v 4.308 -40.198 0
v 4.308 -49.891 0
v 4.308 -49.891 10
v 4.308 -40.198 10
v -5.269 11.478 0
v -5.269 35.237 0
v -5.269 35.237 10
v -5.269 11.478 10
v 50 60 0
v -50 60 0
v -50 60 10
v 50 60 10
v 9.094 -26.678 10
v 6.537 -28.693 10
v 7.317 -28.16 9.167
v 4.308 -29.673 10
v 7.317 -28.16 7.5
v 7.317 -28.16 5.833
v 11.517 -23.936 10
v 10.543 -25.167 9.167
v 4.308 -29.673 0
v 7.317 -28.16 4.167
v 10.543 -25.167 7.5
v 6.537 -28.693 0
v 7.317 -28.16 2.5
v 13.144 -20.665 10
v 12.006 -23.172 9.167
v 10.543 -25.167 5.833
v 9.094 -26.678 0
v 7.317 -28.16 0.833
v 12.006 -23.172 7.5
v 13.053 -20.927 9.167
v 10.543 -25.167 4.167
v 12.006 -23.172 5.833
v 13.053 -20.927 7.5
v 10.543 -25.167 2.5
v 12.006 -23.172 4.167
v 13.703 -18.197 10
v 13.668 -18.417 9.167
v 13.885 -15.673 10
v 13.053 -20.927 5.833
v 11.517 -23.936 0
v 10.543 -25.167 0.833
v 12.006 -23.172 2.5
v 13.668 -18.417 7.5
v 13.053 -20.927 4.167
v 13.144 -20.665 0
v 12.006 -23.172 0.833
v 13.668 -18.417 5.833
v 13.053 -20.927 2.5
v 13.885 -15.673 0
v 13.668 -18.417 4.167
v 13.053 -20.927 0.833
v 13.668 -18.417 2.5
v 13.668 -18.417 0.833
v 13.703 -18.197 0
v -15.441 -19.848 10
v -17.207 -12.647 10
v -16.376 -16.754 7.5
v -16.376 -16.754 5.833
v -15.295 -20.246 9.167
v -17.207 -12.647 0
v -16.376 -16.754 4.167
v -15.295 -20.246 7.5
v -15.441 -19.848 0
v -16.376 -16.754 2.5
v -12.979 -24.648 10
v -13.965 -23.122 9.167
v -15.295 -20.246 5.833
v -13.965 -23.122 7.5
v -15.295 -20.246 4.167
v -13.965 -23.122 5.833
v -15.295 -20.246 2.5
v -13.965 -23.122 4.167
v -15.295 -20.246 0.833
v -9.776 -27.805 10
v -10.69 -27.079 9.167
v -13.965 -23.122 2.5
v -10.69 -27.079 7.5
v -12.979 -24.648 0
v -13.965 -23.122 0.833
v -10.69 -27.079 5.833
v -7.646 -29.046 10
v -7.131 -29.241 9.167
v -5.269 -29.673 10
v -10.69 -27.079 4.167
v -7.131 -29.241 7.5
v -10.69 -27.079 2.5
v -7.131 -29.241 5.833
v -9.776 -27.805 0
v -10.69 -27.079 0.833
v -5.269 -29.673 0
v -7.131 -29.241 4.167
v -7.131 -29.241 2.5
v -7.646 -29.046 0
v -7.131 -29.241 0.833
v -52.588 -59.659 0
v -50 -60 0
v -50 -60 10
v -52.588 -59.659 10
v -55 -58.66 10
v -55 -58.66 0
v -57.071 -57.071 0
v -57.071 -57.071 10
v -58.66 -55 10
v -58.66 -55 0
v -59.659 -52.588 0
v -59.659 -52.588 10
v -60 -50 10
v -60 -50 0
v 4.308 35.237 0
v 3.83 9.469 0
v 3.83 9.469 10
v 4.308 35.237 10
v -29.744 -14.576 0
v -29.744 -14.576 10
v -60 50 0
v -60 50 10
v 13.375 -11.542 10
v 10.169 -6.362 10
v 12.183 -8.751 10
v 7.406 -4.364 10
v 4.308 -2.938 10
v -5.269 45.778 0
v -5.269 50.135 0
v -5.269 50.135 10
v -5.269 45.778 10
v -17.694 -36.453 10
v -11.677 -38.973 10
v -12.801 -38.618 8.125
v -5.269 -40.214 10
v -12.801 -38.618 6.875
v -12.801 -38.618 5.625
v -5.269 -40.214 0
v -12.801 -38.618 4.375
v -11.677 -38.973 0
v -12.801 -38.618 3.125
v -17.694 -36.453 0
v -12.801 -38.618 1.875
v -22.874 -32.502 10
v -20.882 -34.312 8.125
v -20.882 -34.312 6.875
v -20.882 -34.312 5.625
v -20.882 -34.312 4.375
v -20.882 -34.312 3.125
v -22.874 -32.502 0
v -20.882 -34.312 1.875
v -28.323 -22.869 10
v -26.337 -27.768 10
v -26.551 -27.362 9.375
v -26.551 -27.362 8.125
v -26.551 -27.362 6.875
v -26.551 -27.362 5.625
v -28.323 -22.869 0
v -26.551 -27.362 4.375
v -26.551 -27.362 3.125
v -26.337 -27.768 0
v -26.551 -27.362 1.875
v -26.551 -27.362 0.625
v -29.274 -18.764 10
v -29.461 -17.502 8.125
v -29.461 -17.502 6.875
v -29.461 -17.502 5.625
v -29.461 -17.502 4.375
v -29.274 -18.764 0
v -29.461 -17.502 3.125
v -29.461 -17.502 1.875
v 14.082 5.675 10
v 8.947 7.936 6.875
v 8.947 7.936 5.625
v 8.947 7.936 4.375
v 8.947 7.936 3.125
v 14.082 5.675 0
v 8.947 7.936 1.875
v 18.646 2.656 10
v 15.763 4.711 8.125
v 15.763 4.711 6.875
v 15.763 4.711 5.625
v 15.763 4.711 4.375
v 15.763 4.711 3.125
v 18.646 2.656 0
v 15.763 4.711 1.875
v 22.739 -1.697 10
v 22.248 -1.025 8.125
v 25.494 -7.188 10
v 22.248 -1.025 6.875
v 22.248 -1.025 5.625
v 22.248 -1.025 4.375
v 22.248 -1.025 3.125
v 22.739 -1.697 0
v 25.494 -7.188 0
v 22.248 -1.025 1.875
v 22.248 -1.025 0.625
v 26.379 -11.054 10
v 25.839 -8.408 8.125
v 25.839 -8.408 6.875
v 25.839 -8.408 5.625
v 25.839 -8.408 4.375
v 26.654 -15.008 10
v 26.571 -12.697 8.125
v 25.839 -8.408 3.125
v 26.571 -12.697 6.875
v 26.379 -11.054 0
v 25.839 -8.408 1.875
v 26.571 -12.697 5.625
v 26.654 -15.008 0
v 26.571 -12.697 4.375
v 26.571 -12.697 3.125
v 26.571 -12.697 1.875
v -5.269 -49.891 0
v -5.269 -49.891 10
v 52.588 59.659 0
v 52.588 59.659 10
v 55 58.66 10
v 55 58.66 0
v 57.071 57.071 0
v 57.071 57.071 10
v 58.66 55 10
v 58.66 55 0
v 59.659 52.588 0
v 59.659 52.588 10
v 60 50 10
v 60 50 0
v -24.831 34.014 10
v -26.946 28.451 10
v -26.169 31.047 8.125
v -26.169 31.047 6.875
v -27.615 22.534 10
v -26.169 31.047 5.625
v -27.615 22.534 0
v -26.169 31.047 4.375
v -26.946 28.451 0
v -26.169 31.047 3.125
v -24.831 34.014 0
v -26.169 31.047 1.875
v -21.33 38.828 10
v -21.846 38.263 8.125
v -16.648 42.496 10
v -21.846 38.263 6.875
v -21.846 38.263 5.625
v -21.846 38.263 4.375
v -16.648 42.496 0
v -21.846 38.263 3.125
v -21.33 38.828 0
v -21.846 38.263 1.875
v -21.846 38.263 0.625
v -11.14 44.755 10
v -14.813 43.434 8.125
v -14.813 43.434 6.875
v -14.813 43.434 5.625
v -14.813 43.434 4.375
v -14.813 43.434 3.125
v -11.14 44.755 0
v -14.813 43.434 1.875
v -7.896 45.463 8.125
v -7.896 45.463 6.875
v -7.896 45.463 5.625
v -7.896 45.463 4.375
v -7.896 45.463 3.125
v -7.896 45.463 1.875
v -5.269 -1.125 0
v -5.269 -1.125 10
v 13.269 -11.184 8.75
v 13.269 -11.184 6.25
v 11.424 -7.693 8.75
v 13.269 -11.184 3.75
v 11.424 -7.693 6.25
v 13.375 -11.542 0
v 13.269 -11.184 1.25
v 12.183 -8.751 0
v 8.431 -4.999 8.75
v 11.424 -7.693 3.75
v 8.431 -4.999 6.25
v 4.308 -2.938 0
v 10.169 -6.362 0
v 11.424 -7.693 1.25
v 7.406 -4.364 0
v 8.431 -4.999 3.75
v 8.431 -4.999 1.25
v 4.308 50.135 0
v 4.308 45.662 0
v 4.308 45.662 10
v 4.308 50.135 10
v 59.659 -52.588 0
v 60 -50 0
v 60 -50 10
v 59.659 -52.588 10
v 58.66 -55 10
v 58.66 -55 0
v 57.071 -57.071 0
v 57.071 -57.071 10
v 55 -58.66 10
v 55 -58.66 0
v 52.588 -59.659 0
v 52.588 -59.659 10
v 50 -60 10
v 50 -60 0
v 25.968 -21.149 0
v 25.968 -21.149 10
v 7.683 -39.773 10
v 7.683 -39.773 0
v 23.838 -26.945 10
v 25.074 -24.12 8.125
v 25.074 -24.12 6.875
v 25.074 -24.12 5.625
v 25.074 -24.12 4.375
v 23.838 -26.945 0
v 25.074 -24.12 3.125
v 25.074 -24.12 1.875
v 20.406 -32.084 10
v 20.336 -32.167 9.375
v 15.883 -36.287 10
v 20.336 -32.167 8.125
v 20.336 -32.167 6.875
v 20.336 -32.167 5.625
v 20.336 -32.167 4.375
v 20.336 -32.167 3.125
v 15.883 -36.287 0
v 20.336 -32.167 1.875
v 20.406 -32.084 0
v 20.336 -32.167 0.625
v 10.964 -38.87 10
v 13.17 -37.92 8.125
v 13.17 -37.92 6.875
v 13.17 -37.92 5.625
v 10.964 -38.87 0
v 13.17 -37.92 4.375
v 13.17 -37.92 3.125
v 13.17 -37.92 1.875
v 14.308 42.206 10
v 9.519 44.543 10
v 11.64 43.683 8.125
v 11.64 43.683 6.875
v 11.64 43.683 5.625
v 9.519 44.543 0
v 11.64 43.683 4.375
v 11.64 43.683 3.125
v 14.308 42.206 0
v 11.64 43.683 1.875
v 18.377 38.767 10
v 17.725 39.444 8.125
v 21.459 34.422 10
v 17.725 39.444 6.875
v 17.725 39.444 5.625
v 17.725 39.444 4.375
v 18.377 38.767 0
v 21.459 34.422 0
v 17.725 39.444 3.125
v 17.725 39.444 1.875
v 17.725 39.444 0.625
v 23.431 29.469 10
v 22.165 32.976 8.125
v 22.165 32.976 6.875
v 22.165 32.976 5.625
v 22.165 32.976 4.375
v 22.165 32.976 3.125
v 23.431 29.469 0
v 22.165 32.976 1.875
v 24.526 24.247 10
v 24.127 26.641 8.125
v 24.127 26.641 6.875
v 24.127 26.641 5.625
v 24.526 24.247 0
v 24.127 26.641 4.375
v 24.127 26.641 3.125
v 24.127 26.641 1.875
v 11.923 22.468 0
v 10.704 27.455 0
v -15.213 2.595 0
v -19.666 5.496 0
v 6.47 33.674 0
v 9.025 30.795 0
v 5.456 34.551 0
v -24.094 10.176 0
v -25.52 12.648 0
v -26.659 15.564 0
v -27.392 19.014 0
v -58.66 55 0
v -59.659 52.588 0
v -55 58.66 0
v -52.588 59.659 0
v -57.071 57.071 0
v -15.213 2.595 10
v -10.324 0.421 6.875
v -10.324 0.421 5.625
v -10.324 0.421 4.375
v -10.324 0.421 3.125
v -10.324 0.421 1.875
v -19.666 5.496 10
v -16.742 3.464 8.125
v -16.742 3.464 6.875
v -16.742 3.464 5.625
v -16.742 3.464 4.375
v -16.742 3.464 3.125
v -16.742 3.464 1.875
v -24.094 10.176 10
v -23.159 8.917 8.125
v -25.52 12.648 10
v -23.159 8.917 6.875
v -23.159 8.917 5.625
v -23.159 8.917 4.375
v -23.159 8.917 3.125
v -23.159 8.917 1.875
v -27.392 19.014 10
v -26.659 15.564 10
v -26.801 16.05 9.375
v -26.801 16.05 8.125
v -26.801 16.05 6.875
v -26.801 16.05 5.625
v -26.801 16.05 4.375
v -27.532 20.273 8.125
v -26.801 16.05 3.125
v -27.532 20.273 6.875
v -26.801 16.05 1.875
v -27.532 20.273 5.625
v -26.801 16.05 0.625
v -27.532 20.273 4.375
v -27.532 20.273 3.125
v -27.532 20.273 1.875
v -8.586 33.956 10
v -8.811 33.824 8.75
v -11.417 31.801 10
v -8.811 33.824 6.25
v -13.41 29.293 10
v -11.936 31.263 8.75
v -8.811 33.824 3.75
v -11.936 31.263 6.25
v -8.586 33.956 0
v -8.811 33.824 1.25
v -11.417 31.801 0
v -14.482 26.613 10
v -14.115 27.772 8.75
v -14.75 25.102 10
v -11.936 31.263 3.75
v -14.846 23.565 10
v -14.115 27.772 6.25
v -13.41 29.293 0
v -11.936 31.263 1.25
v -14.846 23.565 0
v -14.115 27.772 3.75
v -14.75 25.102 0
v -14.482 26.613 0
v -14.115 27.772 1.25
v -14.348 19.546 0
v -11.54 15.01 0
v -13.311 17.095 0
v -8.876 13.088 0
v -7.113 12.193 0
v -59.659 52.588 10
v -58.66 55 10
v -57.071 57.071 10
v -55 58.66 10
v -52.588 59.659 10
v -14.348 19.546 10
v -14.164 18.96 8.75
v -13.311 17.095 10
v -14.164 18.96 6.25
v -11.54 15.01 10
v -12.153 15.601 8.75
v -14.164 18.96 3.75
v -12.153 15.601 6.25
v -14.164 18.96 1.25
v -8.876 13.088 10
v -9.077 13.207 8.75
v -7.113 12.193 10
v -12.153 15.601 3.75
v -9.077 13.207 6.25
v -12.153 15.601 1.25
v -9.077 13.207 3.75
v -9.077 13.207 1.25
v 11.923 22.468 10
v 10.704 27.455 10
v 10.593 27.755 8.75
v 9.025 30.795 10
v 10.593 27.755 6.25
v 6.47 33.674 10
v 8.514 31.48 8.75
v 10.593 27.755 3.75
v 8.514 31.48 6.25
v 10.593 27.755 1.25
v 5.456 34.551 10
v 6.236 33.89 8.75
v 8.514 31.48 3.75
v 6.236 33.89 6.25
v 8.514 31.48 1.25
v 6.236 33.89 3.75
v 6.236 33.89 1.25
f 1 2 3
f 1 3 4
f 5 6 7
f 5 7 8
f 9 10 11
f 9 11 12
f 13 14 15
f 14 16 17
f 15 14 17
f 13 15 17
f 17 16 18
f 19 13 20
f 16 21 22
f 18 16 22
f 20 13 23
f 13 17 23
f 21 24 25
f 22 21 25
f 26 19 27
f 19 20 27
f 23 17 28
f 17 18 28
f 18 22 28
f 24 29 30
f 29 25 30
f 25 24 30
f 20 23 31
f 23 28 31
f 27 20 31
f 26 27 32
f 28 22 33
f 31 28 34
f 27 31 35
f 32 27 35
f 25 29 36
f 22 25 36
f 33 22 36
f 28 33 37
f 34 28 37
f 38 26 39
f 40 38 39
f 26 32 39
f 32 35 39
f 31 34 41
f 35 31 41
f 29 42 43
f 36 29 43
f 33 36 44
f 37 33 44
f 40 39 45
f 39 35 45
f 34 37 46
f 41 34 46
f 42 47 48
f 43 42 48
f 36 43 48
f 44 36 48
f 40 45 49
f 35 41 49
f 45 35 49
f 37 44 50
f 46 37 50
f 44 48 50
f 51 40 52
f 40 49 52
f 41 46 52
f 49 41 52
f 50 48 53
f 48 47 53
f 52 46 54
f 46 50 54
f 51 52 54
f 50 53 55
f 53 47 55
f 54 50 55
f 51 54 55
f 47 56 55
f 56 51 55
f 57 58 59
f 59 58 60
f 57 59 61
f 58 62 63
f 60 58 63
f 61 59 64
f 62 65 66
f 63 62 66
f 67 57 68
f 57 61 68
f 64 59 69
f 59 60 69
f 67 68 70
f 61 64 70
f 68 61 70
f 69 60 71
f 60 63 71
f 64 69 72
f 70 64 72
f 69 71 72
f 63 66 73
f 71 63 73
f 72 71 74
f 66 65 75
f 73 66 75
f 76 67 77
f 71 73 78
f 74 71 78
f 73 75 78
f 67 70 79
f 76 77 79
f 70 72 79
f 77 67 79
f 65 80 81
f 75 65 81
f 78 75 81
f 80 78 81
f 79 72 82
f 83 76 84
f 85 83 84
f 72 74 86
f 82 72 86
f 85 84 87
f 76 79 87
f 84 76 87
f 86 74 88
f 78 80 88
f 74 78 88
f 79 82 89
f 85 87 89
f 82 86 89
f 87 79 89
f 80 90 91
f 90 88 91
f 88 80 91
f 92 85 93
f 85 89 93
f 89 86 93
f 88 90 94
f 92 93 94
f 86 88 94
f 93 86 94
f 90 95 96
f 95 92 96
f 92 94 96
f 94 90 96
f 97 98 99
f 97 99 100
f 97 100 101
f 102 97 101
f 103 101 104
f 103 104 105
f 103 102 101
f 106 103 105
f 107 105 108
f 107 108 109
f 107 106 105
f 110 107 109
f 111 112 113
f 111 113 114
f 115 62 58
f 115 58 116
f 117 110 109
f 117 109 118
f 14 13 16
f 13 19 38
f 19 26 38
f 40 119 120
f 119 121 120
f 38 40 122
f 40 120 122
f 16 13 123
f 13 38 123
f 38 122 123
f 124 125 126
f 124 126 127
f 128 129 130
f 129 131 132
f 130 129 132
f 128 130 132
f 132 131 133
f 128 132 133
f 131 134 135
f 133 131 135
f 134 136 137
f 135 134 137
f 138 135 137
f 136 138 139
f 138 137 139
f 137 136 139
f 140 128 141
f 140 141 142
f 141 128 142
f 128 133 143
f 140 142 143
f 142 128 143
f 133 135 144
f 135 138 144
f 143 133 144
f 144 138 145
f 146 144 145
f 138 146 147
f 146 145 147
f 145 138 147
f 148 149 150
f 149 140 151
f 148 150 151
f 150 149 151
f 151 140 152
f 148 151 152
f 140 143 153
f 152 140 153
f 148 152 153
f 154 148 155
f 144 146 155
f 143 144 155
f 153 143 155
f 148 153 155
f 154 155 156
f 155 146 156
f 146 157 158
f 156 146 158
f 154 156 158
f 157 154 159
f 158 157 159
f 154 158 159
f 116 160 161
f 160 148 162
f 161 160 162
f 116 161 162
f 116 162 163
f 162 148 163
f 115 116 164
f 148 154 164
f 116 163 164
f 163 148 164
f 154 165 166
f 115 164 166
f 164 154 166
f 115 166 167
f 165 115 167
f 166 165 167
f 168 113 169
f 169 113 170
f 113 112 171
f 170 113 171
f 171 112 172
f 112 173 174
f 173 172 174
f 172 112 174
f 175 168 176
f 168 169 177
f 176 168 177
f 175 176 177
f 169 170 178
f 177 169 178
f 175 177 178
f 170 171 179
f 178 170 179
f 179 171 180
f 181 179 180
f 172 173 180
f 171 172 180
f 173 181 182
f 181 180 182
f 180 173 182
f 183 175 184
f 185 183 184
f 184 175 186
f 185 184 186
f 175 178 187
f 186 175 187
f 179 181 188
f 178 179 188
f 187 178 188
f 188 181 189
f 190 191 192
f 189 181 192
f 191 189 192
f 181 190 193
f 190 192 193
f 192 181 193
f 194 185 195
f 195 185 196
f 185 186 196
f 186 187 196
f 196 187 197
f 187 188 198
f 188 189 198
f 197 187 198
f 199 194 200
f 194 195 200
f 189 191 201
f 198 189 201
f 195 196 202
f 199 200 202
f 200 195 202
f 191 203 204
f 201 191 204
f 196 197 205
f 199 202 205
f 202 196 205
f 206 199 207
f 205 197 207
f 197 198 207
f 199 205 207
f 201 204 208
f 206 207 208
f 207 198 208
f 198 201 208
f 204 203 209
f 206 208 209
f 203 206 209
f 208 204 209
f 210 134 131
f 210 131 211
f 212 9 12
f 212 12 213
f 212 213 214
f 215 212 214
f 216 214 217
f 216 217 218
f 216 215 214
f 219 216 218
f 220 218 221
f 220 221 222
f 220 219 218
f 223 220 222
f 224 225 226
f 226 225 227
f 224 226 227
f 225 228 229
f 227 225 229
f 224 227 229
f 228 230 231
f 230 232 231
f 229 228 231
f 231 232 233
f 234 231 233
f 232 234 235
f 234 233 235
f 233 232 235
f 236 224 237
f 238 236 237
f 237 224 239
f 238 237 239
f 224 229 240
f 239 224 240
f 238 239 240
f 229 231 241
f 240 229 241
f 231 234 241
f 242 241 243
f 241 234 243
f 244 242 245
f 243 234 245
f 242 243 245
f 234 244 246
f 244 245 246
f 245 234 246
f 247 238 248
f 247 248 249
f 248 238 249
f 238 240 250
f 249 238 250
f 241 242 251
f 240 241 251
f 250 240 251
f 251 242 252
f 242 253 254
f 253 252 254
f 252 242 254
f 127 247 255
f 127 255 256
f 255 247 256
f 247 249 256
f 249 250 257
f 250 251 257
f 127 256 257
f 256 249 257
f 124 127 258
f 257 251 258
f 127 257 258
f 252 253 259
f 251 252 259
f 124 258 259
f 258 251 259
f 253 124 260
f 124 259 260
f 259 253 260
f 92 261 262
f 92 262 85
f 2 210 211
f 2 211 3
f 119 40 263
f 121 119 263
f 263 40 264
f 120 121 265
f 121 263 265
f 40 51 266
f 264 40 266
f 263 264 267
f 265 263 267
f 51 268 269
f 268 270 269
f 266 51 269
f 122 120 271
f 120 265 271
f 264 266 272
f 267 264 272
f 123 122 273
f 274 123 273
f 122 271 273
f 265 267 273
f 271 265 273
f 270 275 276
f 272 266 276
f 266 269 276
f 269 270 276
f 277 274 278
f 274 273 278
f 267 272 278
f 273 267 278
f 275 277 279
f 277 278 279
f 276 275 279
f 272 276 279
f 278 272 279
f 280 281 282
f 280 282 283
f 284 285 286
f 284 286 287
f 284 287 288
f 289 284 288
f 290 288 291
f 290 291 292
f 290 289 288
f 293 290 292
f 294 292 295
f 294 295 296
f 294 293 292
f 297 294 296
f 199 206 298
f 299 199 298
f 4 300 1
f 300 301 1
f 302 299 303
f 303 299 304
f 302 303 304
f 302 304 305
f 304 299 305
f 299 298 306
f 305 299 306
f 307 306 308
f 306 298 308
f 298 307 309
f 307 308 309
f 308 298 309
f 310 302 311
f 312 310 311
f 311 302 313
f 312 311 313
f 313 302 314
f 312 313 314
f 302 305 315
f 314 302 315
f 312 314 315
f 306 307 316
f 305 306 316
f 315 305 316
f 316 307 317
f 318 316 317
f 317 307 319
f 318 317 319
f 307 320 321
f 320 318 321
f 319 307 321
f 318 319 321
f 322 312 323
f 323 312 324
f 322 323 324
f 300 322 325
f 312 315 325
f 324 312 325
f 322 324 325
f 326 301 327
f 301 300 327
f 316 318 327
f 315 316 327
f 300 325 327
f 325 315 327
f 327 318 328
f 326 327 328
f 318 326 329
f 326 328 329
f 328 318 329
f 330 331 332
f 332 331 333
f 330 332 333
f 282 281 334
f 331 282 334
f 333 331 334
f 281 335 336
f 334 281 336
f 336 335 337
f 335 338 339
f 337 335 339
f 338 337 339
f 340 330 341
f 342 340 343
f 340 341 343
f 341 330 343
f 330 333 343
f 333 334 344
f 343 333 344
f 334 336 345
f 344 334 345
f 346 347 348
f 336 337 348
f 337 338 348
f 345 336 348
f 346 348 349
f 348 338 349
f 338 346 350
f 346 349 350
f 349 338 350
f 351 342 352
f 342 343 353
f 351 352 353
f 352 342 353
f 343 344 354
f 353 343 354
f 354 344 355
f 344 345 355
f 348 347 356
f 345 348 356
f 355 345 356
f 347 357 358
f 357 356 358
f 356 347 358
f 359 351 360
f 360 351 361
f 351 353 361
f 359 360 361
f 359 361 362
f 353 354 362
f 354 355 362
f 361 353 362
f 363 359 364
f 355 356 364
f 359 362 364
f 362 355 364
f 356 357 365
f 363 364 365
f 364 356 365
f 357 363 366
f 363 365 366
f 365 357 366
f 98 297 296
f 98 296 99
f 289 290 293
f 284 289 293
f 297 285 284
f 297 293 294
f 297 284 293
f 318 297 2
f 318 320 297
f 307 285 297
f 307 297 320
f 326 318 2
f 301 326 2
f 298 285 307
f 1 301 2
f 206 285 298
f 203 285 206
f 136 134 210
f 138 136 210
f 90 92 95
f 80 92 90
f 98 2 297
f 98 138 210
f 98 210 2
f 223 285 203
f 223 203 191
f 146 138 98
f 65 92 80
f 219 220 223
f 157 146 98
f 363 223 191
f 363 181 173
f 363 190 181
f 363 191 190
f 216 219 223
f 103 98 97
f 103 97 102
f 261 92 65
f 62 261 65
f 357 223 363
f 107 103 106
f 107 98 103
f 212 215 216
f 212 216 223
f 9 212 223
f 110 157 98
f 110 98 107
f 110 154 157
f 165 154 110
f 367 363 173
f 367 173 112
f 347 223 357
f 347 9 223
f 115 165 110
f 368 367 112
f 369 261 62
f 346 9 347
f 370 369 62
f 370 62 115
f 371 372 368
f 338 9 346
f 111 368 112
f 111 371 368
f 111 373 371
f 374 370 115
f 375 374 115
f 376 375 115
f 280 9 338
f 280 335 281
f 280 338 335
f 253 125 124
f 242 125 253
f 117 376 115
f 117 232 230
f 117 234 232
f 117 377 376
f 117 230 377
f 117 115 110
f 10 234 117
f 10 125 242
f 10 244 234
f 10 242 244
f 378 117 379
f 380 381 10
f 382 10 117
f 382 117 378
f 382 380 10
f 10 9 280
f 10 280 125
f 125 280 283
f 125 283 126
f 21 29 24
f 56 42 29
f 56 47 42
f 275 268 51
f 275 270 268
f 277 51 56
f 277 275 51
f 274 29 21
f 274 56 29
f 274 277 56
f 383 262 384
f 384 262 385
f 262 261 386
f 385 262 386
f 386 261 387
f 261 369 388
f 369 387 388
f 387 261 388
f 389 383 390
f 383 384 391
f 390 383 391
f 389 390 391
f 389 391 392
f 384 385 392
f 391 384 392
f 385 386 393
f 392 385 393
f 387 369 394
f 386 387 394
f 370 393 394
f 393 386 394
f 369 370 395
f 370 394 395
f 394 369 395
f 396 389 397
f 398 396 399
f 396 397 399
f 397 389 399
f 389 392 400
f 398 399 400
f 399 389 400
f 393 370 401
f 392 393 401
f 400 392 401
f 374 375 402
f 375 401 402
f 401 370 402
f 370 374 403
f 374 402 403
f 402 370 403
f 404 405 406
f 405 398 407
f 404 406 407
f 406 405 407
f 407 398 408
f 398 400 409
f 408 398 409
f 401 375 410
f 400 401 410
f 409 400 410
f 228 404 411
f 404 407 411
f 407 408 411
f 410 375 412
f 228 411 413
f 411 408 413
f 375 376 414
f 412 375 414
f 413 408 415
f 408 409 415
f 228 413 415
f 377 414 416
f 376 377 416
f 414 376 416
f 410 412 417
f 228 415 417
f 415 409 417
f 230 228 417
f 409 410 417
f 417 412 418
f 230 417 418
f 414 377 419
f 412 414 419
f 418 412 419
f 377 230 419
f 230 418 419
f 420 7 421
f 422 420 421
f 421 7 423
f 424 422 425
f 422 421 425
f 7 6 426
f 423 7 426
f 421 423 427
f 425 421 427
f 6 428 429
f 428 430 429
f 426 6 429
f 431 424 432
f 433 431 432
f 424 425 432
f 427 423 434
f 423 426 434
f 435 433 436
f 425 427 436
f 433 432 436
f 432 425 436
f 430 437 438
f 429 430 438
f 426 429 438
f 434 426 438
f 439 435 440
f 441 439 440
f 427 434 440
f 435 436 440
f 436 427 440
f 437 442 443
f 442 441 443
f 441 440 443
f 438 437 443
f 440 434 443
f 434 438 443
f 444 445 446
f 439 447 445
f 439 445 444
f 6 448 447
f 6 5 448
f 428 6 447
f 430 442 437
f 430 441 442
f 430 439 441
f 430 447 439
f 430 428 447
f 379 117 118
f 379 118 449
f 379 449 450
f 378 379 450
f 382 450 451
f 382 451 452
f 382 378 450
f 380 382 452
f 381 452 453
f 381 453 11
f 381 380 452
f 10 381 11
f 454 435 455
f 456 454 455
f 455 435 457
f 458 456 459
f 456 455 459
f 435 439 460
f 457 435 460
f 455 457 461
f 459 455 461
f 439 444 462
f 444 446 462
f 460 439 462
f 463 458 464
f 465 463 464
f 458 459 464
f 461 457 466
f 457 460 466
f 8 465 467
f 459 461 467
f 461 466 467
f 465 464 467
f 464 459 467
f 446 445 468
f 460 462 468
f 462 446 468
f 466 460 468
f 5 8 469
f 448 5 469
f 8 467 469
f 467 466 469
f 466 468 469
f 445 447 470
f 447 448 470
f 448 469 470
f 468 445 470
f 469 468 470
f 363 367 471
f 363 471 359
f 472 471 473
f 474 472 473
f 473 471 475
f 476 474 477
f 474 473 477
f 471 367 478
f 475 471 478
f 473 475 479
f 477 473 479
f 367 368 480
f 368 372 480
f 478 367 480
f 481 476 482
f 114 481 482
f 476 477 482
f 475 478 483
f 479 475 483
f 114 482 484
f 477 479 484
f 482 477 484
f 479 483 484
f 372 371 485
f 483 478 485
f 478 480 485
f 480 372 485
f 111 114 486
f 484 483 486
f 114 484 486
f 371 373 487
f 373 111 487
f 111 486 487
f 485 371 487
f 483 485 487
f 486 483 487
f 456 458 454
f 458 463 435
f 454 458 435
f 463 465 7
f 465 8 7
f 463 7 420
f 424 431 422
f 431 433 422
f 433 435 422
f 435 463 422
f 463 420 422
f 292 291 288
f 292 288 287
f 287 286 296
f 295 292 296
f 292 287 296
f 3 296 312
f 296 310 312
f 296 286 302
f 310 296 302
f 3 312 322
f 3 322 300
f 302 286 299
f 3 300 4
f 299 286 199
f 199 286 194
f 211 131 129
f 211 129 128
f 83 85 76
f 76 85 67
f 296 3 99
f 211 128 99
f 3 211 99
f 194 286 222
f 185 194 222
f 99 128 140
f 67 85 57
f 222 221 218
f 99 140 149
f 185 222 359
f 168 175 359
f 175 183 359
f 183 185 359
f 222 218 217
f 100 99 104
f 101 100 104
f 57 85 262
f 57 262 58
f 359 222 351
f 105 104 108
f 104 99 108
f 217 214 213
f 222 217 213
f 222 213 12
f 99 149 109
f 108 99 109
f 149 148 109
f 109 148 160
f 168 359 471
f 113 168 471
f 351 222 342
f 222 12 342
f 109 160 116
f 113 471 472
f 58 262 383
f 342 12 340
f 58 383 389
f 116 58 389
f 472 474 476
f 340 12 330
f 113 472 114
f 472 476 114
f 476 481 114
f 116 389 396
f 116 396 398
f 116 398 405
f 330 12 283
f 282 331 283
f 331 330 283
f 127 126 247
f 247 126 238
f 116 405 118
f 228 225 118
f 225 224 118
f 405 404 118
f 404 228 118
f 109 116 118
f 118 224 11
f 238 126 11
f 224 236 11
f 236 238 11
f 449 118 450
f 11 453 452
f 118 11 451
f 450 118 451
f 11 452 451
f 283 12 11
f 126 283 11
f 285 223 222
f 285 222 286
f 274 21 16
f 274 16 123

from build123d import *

# Parameters (mm, degrees)
BOSS_EXTRUDE1_DEPTH = 10
CUT_EXTRUDE12_START = -10
CUT_EXTRUDE12_DEPTH = 10


# Read off the part's stored shape, not the designer's step: Cut-Extrude12
with BuildPart() as part:
    # Sketch1 → Boss-Extrude1 (new body)
    with BuildSketch(Plane.XY):
        with BuildLine():
            Line((-50, 60), (50, 60))
            ThreePointArc((50, 60), (57.071067812, 57.071067812), (60, 50))
            Line((60, 50), (60, -50))
            ThreePointArc((60, -50), (57.071067812, -57.071067812), (50, -60))
            Line((50, -60), (-50, -60))
            ThreePointArc((-50, -60), (-57.071067812, -57.071067812), (-60, -50))
            Line((-60, -50), (-60, 50))
            ThreePointArc((-60, 50), (-57.071067812, 57.071067812), (-50, 60))
        make_face()
    extrude(amount=BOSS_EXTRUDE1_DEPTH)

    # Cut-Extrude12 outline → Cut-Extrude12 (cut)
    with BuildSketch(Plane.XY.offset(10).offset(CUT_EXTRUDE12_START)):
        with BuildLine():
            add(Edge.make_bspline(
                [(3.829899736, 9.469331853), (4.651101258, 9.255238705), (6.373065179, 8.800211267), (8.910934261, 7.982854414), (11.370568201, 6.996591048), (13.654680469, 5.93358143), (15.746006939, 4.757378698), (17.659586078, 3.474790317), (19.370064675, 2.073234039), (20.913516847, 0.590371796), (22.274195276, -0.997388115), (23.43779351, -2.704433385), (24.436709807, -4.500607784), (25.271405111, -6.398372377), (25.869216217, -8.413908853), (26.31913094, -10.520378408), (26.618016027, -12.727600555), (26.641728545, -14.23705148), (26.653846154, -15.008413462)],
                knots=[0.01036212, 0.01036212, 0.01036212, 0.01036212, 0.079332881, 0.155118053, 0.22688904, 0.294596679, 0.359746021, 0.421715561, 0.48158665, 0.539247834, 0.595485549, 0.651212183, 0.706865943, 0.762348073, 0.819345598, 0.877392597, 0.937344973, 1, 1, 1, 1], degree=3))
            Line((3.829899736, 9.469331853), (4.307692308, 35.237179487))
            add(Edge.make_bspline(
                [(11.922676282, 22.467948718), (11.756118771, 23.42078508), (11.442414071, 25.215415917), (10.668746906, 27.678761902), (9.747307562, 29.775480397), (8.588163562, 31.445492494), (7.410130151, 32.779570621), (6.303990971, 33.842612469), (5.324129932, 34.703821515), (4.625223761, 35.070560378), (4.307692308, 35.237179487)],
                knots=[0, 0, 0, 0, 0.187997623, 0.354086332, 0.501244759, 0.631642506, 0.747788284, 0.84692094, 0.930452157, 1, 1, 1, 1], degree=3))
            Line((11.922676282, 22.467948718), (24.525641026, 24.246995192))
            add(Edge.make_bspline(
                [(4.307692308, 45.662059295), (4.957696866, 45.577493429), (6.243982537, 45.410147125), (8.125446929, 44.993554081), (9.92902863, 44.428849803), (11.645548985, 43.709709033), (13.28315267, 42.854224926), (14.85468999, 41.876807221), (16.338865776, 40.732755063), (17.749840099, 39.463220808), (19.049720083, 38.041523481), (20.234930756, 36.492862307), (21.288928545, 34.80136789), (22.203523076, 32.963095038), (22.982943743, 30.98113234), (23.623379472, 28.859981153), (24.168134589, 26.608221373), (24.404467535, 25.047310905), (24.525641026, 24.246995192)],
                knots=[0, 0, 0, 0, 0.061357795, 0.121420152, 0.180181431, 0.238107144, 0.295441655, 0.353038633, 0.411166255, 0.470688067, 0.530559539, 0.591281942, 0.653059701, 0.716885302, 0.783285835, 0.852233503, 0.924236622, 1, 1, 1, 1], degree=3))
            Line((4.307692308, 45.662059295), (4.307692308, 50.134615385))
            Line((4.307692308, 50.134615385), (-5.269230769, 50.134615385))
            Line((-5.269230769, 50.134615385), (-5.269230769, 45.778445513))
            add(Edge.make_bspline(
                [(-27.615384615, 22.534455128), (-27.602748482, 23.283660324), (-27.577756275, 24.765465769), (-27.279217809, 26.938999246), (-26.834595345, 29.037892018), (-26.203213071, 31.054874397), (-25.380107075, 32.98670666), (-24.402120944, 34.851017323), (-23.207872424, 36.608309251), (-21.866273289, 38.295918436), (-20.346458111, 39.852364991), (-18.657456687, 41.24113319), (-16.809355132, 42.444954007), (-14.806911484, 43.482903512), (-12.638425501, 44.318779361), (-10.328369652, 45.008790952), (-7.857443216, 45.510911003), (-6.146911468, 45.687722715), (-5.269230769, 45.778445513)],
                knots=[0, 0, 0, 0, 0.062742301, 0.124094017, 0.183487802, 0.24239109, 0.30087542, 0.359258235, 0.418512032, 0.478642131, 0.53972959, 0.600445154, 0.661504357, 0.724236343, 0.789093431, 0.855954955, 0.92608991, 1, 1, 1, 1], degree=3))
            add(Edge.make_bspline(
                [(-5.269230769, -1.125200321), (-6.137019995, -0.897690659), (-7.842567008, -0.450544727), (-10.290281253, 0.389164268), (-12.595271169, 1.293897806), (-14.73580601, 2.317802511), (-16.733652862, 3.42736479), (-18.584240651, 4.637458518), (-20.27204064, 5.959006773), (-21.806820404, 7.371581142), (-23.183957959, 8.886886999), (-24.364565463, 10.524284334), (-25.376108886, 12.264514626), (-26.178064087, 14.117370849), (-26.850827695, 16.062441252), (-27.275834031, 18.130892044), (-27.580156931, 20.297465856), (-27.603496905, 21.779574935), (-27.615384615, 22.534455128)],
                knots=[0, 0, 0, 0, 0.075844255, 0.14906378, 0.21869239, 0.28515057, 0.349567627, 0.411836178, 0.471936074, 0.530643634, 0.588057184, 0.644777819, 0.701053245, 0.757922797, 0.815282754, 0.874763549, 0.936213523, 1, 1, 1, 1], degree=3))
            Line((-5.269230769, -1.125200321), (-5.269230769, -29.673076923))
            add(Edge.make_bspline(
                [(-17.20713141, -12.647435897), (-17.08632667, -13.358103486), (-16.852172066, -14.735583268), (-16.402664345, -16.716844049), (-15.888887925, -18.541610498), (-15.327187544, -20.216203966), (-14.697345018, -21.735003901), (-14.001765082, -23.096687891), (-13.254039271, -24.310948037), (-12.191153535, -25.66682637), (-10.783612806, -27.070335372), (-9.01737936, -28.391176881), (-7.184967958, -29.322557123), (-5.898886501, -29.557869679), (-5.269230769, -29.673076923)],
                knots=[0, 0, 0, 0, 0.097084149, 0.188177222, 0.273492383, 0.352340669, 0.425958464, 0.494735062, 0.55811846, 0.61769945, 0.726439675, 0.824685012, 0.914167111, 1, 1, 1, 1], degree=3))
            Line((-17.20713141, -12.647435897), (-29.743589744, -14.576121795))
            add(Edge.make_bspline(
                [(-5.269230769, -40.214342949), (-6.152504611, -40.105581471), (-7.885148124, -39.892233289), (-10.402821078, -39.353955628), (-12.780954336, -38.657577725), (-15.018676957, -37.812241533), (-17.111032946, -36.802994053), (-19.08058104, -35.664362641), (-20.902183607, -34.343702464), (-22.570873783, -32.854991024), (-24.099322265, -31.209293922), (-25.42524832, -29.362444966), (-26.606838728, -27.355244963), (-27.578162277, -25.145624763), (-28.393281812, -22.758838626), (-29.037258654, -20.195622566), (-29.510737122, -17.449905769), (-29.664413014, -15.553292744), (-29.743589744, -14.576121795)],
                knots=[0, 0, 0, 0, 0.068062898, 0.133513224, 0.196710589, 0.25750662, 0.316300014, 0.374261821, 0.431343721, 0.488108177, 0.545127046, 0.602801199, 0.661709163, 0.723017629, 0.787114741, 0.854476625, 0.925023601, 1, 1, 1, 1], degree=3))
            Line((-5.269230769, -40.214342949), (-5.269230769, -49.891025641))
            Line((-5.269230769, -49.891025641), (4.307692308, -49.891025641))
            Line((4.307692308, -49.891025641), (4.307692308, -40.197716346))
            add(Edge.make_bspline(
                [(26.653846154, -15.008413462), (26.635668711, -15.802035053), (26.599690415, -17.372836449), (26.282633466, -19.690279279), (25.815106337, -21.950014152), (25.100127809, -24.129672631), (24.226389701, -26.259199608), (23.114288353, -28.301611461), (21.832102403, -30.291574777), (20.365057121, -32.184020449), (18.751397428, -33.942797936), (16.999051073, -35.49338187), (15.145875566, -36.833250571), (13.185970917, -37.956865389), (11.119361206, -38.862081523), (8.939264471, -39.516798484), (6.665053749, -40.001673764), (5.102568108, -40.131612989), (4.307692308, -40.197716346)],
                knots=[0, 0, 0, 0, 0.064082293, 0.126836967, 0.188659935, 0.250253877, 0.311868971, 0.374367568, 0.437829023, 0.502936996, 0.567572169, 0.630373145, 0.691634215, 0.752000314, 0.812555404, 0.87345381, 0.935622766, 1, 1, 1, 1], degree=3))
        make_face()
        with BuildLine():
            add(Edge.make_bspline(
                [(4.307692308, -29.673076923), (4.809999517, -29.50408965), (5.882907448, -29.143139653), (7.411725674, -28.132874023), (9.00773224, -26.816272645), (10.3184365, -25.45744691), (11.339462013, -24.217093709), (12.027830838, -23.185071901), (12.58287141, -22.076500272), (13.082257467, -20.924452078), (13.442178397, -19.69497539), (13.680544359, -18.406870485), (13.864485194, -17.064209311), (13.877786755, -16.145246178), (13.884615385, -15.673477564)],
                knots=[0, 0, 0, 0, 0.087571184, 0.187048516, 0.301323891, 0.430677181, 0.499294631, 0.567615943, 0.635856829, 0.704652579, 0.77561251, 0.847718078, 0.921822945, 1, 1, 1, 1], degree=3))
            Line((4.307692308, -29.673076923), (4.307692308, -2.9375))
            add(Edge.make_bspline(
                [(13.884615385, -15.673477564), (13.861276644, -14.878025485), (13.816754622, -13.360585586), (13.33326714, -11.211891668), (12.585421154, -9.296003879), (11.4577088, -7.648939589), (10.073004894, -6.205542924), (8.411562501, -4.929357307), (6.476245927, -3.81237526), (5.047387135, -3.23592043), (4.307692308, -2.9375)],
                knots=[0, 0, 0, 0, 0.138747891, 0.264681671, 0.38282422, 0.495893222, 0.610959817, 0.731050713, 0.860769729, 1, 1, 1, 1], degree=3))
        make_face(mode=Mode.SUBTRACT)
        with BuildLine():
            add(Edge.make_bspline(
                [(-5.269230769, 35.237179487), (-5.886361442, 35.069325676), (-7.119551097, 34.733909545), (-8.851804055, 33.852303433), (-10.484715507, 32.708860722), (-11.969797, 31.294446838), (-13.280862837, 29.670576278), (-14.171907462, 27.781767485), (-14.752076649, 25.733319294), (-14.814229335, 24.301006812), (-14.846153846, 23.565304487)],
                knots=[0, 0, 0, 0, 0.117427758, 0.234651595, 0.35547186, 0.483173361, 0.611090543, 0.736987217, 0.864904399, 1, 1, 1, 1], degree=3))
            Line((-5.269230769, 35.237179487), (-5.269230769, 11.477764423))
            add(Edge.make_bspline(
                [(-14.846153846, 23.565304487), (-14.820564775, 22.741592722), (-14.772088924, 21.181155869), (-14.243474845, 19.003113998), (-13.419363639, 17.109994682), (-12.196547416, 15.556339307), (-10.716435235, 14.283601685), (-9.076995365, 13.161437362), (-7.252756905, 12.203139512), (-5.940602494, 11.723284921), (-5.269230769, 11.477764423)],
                knots=[0, 0, 0, 0, 0.147624976, 0.279660267, 0.399910368, 0.515563211, 0.631186078, 0.749329827, 0.871743093, 1, 1, 1, 1], degree=3))
        make_face(mode=Mode.SUBTRACT)
    extrude(amount=CUT_EXTRUDE12_DEPTH, mode=Mode.SUBTRACT)


solid = part.part
